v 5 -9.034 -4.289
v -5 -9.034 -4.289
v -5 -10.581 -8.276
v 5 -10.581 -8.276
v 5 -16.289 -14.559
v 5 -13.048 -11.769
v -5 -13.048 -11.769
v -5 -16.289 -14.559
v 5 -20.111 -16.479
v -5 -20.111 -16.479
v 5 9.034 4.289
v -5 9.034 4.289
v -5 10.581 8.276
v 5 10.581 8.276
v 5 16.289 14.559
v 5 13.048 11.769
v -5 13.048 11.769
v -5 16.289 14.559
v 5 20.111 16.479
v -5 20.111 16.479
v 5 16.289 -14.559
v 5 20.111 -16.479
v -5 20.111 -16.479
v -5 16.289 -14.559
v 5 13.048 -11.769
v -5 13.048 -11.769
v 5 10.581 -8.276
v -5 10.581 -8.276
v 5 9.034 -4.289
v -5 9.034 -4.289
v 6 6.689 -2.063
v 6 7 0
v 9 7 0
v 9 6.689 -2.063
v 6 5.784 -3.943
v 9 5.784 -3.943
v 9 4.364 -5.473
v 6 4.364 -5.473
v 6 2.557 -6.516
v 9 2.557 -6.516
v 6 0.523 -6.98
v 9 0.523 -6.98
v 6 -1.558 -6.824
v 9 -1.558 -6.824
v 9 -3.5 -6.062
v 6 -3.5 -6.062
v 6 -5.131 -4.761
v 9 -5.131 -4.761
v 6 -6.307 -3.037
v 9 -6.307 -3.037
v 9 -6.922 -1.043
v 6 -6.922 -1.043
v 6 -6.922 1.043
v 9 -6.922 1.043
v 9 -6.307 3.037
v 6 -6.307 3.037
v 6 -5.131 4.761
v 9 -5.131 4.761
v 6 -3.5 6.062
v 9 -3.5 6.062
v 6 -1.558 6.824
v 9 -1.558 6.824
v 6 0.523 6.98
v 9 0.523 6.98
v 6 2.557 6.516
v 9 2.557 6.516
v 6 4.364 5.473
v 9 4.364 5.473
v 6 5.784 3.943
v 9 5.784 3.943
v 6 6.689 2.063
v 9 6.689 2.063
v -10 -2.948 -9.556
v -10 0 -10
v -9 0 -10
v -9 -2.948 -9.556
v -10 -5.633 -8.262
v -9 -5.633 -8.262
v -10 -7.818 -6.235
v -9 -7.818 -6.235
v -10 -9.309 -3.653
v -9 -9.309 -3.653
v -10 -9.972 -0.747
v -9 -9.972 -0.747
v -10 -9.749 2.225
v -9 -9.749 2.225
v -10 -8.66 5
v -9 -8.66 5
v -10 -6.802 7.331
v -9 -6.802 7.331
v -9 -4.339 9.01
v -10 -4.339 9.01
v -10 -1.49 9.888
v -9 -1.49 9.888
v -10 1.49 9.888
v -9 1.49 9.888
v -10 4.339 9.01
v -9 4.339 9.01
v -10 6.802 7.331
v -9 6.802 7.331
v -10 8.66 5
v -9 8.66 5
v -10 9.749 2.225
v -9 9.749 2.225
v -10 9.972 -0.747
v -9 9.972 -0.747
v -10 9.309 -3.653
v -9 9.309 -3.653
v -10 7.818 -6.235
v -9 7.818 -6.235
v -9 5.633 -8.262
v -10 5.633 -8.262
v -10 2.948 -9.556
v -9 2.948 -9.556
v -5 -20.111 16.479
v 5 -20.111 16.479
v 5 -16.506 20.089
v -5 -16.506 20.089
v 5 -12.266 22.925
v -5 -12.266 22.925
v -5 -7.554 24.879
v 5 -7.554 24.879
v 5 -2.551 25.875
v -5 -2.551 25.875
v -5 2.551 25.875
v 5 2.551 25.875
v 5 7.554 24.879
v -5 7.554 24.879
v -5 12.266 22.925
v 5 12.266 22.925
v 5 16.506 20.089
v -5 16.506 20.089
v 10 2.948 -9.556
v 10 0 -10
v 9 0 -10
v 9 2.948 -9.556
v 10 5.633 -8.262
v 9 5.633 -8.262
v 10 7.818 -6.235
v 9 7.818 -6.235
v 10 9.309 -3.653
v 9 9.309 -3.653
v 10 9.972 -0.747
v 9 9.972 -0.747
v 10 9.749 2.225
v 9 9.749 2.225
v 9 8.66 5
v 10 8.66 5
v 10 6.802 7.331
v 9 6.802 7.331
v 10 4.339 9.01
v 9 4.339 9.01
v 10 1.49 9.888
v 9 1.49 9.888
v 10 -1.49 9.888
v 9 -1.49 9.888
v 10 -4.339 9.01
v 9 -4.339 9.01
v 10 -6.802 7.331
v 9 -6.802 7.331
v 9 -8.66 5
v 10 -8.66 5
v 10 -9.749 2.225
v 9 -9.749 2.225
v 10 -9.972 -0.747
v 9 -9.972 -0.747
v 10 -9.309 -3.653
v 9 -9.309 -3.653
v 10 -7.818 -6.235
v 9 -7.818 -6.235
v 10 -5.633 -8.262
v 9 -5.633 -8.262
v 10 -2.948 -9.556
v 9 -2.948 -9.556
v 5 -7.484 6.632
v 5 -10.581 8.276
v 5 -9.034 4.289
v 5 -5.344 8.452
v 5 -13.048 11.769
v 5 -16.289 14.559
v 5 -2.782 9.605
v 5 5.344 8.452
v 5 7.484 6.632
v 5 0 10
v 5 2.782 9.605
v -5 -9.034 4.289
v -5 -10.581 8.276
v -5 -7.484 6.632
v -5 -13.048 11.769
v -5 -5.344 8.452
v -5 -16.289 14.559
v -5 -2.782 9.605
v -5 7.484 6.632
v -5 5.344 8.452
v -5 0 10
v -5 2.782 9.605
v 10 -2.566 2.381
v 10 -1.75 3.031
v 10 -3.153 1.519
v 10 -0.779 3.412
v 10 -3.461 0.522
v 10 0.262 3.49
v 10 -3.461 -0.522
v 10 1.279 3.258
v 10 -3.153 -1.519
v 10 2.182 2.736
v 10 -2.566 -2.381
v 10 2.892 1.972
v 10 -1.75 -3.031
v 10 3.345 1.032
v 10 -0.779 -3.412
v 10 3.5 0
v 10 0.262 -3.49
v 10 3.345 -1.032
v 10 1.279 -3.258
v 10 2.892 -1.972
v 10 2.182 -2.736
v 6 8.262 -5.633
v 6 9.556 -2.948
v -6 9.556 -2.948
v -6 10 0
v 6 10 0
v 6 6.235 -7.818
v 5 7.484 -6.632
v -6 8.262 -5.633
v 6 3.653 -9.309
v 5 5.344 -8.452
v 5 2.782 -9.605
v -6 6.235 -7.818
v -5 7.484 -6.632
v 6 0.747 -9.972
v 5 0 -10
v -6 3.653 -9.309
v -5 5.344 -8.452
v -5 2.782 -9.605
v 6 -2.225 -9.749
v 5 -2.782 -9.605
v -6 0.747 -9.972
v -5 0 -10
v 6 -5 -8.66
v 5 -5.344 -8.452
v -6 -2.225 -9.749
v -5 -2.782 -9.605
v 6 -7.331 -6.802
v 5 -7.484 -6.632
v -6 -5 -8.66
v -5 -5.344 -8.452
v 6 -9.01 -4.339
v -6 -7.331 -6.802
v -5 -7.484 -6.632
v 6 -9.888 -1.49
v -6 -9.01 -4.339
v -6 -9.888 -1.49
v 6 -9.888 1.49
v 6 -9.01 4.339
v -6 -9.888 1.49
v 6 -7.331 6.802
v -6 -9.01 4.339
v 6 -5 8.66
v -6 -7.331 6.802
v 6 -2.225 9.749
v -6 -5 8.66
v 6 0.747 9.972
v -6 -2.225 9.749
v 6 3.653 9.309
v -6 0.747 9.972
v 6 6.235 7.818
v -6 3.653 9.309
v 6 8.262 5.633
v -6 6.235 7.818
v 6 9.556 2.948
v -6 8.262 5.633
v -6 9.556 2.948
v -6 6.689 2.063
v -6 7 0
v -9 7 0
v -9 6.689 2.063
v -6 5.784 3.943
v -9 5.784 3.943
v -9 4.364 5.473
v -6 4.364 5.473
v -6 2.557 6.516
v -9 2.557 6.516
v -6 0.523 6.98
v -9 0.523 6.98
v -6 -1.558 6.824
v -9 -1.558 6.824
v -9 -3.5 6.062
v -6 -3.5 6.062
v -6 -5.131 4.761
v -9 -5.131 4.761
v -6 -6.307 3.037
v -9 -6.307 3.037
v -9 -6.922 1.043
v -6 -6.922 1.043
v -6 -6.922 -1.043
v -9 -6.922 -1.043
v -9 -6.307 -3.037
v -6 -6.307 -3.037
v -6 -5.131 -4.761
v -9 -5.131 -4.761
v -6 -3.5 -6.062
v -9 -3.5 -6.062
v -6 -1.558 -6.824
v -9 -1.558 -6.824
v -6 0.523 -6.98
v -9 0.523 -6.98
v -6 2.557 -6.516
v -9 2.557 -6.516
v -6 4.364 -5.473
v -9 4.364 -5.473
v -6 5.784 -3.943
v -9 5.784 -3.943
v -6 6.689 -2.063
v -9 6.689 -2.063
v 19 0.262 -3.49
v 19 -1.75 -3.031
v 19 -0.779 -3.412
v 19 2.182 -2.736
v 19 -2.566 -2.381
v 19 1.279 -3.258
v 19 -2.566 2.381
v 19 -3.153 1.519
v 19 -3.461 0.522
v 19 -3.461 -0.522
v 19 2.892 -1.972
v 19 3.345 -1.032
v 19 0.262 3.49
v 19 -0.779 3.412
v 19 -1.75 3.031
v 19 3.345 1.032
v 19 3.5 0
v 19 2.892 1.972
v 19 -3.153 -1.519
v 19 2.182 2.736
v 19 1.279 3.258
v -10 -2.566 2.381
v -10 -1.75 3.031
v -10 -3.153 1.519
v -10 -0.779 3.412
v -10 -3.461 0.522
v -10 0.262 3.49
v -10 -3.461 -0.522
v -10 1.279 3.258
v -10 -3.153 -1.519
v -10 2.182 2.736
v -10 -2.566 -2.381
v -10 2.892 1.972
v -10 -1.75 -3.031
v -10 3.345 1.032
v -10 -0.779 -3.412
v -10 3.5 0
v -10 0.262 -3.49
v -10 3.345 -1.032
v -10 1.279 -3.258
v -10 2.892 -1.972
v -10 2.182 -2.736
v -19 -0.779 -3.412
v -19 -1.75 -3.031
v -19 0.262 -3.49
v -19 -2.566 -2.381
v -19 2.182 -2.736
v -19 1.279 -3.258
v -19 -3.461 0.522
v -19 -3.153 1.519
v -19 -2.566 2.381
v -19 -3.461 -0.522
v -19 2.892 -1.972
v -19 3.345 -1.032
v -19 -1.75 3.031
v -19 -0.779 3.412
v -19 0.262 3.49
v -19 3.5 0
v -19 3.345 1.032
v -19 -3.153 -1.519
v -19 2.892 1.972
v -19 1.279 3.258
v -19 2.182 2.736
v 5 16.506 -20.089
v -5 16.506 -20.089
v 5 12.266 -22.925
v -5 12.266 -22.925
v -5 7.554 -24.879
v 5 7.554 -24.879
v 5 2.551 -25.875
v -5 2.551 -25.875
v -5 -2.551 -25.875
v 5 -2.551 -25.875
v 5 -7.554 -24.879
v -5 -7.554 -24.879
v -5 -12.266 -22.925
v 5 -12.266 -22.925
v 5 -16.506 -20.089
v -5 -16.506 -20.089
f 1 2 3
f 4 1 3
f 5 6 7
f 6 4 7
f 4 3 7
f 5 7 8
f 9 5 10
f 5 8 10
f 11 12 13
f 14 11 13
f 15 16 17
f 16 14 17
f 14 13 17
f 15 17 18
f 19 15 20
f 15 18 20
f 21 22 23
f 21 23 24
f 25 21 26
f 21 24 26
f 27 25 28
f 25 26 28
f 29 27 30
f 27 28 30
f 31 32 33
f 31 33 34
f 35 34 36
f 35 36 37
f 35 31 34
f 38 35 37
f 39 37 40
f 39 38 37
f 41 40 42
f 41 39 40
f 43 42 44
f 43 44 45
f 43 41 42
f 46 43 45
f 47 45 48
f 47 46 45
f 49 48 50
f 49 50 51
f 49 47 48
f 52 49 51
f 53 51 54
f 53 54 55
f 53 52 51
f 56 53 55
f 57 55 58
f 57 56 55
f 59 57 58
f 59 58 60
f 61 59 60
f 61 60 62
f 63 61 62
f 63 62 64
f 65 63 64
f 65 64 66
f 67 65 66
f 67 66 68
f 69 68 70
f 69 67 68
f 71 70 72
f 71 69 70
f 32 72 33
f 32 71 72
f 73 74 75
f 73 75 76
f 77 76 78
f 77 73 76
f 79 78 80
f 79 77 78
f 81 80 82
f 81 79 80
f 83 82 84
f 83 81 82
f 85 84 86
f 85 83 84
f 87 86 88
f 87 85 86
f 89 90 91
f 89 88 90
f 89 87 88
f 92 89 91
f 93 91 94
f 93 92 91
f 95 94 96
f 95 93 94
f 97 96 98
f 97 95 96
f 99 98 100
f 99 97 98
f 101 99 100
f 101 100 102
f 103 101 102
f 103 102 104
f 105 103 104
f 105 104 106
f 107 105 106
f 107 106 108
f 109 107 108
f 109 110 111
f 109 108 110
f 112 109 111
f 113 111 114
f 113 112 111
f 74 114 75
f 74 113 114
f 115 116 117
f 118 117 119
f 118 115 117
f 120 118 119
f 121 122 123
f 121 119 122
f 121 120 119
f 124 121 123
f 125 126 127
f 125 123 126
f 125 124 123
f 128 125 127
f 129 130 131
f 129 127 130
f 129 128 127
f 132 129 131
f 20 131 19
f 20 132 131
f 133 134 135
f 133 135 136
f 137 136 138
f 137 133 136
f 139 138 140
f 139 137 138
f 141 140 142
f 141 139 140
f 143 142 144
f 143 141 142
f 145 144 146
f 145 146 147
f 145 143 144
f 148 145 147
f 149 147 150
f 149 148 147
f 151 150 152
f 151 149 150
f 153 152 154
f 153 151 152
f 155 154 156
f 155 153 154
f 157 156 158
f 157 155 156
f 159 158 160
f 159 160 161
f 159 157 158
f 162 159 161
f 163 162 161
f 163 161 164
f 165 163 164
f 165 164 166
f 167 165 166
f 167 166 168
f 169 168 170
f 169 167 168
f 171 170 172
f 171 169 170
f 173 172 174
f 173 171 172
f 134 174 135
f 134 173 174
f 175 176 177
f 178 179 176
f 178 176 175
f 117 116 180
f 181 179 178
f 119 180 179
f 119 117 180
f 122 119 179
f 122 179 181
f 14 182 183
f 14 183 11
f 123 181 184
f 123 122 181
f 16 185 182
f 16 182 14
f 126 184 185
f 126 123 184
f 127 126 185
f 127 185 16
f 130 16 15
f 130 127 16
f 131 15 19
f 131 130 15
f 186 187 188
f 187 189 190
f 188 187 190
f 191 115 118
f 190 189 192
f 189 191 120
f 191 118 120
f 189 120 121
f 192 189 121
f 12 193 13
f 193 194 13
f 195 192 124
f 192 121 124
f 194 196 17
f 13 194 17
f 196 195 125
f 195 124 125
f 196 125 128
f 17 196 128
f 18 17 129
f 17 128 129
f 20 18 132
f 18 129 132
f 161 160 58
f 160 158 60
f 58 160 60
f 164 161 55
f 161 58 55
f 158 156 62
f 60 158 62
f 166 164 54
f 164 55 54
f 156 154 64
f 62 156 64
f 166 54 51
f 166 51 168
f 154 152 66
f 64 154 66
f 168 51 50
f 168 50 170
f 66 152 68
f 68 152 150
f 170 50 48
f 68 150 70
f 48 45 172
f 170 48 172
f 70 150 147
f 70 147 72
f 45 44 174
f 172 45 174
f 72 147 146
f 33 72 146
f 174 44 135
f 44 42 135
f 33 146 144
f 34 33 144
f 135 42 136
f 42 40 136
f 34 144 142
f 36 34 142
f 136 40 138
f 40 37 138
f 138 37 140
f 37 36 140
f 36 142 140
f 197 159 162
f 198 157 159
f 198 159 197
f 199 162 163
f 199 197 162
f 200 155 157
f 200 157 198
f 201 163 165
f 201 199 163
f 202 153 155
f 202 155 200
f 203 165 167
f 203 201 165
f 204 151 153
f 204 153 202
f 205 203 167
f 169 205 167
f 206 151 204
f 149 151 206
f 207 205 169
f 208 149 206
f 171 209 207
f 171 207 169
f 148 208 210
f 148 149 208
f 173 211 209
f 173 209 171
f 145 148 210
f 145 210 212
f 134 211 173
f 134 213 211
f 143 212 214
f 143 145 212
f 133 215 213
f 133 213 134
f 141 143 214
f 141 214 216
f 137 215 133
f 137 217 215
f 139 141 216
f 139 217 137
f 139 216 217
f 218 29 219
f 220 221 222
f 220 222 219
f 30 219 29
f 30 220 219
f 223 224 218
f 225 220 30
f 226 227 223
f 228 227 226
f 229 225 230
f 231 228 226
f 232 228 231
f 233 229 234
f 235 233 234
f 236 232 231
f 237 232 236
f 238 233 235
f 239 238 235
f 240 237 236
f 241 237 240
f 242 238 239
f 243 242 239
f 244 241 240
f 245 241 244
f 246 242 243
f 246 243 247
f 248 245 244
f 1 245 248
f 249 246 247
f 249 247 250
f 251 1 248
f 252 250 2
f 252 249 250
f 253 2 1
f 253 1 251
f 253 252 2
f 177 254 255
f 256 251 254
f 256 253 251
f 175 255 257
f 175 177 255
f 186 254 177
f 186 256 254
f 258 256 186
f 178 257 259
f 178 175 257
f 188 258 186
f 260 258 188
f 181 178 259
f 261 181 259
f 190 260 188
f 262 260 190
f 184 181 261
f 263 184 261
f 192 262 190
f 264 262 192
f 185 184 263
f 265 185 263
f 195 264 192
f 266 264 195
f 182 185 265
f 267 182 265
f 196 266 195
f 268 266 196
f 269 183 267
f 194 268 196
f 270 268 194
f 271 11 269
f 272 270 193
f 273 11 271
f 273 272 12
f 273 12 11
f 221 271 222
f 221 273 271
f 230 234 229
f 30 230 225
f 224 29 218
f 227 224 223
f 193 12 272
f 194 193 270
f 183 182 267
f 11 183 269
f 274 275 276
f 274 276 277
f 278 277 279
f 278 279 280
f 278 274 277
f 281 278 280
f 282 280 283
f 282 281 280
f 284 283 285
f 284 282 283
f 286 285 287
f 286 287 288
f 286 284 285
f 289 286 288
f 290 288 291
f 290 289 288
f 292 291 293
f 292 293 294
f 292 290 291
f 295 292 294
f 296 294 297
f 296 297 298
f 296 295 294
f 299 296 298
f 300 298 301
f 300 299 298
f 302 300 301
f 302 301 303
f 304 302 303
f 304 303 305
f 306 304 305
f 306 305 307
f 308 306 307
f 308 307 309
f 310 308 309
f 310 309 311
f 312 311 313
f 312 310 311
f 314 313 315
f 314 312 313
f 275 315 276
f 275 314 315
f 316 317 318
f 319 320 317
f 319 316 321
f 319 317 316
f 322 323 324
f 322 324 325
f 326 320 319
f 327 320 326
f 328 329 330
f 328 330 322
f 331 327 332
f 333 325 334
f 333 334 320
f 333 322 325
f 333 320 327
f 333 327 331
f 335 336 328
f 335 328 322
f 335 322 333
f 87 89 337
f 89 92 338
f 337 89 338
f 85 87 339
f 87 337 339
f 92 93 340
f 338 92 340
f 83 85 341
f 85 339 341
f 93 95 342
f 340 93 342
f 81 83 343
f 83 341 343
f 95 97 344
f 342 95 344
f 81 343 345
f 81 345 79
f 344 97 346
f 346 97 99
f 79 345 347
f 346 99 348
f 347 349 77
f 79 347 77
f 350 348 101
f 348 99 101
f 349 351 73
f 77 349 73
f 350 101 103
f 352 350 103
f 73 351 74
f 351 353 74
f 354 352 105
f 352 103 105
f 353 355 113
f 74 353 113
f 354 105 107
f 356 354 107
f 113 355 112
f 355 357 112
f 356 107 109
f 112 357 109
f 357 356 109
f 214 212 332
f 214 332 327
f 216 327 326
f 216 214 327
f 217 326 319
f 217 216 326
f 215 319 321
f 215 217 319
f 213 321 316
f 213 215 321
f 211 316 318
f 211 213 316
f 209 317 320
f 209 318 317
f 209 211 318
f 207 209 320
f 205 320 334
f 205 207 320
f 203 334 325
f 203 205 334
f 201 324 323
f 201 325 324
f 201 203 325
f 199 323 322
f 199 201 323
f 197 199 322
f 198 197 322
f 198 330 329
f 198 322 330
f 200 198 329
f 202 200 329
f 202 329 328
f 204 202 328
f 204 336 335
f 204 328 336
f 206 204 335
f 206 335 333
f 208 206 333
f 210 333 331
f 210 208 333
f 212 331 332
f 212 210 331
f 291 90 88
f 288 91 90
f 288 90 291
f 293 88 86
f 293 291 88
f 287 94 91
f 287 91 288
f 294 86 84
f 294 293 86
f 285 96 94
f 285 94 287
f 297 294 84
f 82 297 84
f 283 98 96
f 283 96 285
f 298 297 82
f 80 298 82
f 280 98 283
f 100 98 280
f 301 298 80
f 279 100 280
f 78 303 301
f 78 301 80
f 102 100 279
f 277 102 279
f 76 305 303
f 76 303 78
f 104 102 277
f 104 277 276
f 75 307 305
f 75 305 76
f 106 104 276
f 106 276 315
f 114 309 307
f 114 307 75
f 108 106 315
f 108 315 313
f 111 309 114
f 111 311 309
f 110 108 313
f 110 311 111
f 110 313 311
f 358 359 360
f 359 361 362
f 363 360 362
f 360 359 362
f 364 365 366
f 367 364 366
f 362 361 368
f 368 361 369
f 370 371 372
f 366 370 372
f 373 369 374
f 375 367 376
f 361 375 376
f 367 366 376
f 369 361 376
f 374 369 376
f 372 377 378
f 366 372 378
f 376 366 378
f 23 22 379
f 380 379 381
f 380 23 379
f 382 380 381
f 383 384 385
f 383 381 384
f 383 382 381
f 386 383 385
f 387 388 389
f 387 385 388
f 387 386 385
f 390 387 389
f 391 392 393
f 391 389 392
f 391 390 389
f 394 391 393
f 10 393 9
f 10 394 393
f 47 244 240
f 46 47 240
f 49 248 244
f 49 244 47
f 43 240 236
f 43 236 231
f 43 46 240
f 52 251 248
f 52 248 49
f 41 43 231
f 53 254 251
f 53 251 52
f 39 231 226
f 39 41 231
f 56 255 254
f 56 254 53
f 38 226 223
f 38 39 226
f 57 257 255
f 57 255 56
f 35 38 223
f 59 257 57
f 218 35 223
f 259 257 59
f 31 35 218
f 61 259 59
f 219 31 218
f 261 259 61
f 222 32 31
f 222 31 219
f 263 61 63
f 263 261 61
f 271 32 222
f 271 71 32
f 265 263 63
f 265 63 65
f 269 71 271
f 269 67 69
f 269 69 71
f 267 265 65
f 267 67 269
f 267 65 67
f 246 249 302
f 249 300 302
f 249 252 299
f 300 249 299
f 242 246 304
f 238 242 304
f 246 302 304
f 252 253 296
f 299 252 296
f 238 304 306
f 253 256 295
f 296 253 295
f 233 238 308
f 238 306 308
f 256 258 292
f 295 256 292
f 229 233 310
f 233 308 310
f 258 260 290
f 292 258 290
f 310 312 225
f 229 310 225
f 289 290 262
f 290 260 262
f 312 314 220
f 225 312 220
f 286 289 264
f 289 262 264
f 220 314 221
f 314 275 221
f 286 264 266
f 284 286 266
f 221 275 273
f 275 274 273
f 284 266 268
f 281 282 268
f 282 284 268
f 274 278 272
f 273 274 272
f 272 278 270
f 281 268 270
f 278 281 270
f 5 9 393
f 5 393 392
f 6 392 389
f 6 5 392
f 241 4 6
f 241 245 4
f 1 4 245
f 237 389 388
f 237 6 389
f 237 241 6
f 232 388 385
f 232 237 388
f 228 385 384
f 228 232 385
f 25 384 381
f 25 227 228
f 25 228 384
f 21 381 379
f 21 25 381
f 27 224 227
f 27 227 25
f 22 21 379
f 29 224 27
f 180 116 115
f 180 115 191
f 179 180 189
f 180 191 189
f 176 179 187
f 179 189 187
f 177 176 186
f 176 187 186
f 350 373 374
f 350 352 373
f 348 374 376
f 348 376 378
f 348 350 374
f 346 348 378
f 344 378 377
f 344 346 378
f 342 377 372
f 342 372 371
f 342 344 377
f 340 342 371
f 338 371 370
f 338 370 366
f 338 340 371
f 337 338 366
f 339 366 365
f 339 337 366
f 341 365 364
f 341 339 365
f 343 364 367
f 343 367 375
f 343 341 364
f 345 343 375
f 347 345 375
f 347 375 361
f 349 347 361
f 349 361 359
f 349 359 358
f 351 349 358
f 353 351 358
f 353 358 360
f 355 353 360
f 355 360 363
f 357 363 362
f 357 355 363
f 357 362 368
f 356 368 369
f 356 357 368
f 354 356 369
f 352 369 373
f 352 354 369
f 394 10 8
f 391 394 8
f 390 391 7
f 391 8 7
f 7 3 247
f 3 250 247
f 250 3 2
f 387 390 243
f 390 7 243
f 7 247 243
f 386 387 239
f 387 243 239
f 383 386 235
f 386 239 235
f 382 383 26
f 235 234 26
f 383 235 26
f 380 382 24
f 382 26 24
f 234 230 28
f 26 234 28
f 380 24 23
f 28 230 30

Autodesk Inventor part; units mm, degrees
ref_plane "YZ Plane" through (0, 0, 0) normal (1, 0, 0) x (0, 1, 0)
ref_plane "XZ Plane" through (0, 0, 0) normal (0, 1, 0) x (-1, 0, 0)
ref_plane "XY Plane" through (0, 0, 0) normal (0, 0, 1) x (1, 0, 0)
sketch "Boceto1" plane through (0, 0, 0) normal (1, 0, 0) x (0, 1, 0)
  circle A0 centre (0, 0) radius 3.5
  dimension "d0" = 7
extrude "Extrusión1" add sketch "Boceto1" along normal mid plane 38
sketch "Boceto2" plane through (0, 0, 0) normal (1, 0, 0) x (0, 1, 0)
  arc A0 (20.1106, 16.4792) -> (20.1106, -16.4792) centre (26, 0) ccw
  arc A1 (-20.1106, -16.4792) -> (-20.1106, 16.4792) centre (-26, 0) ccw
  arc A2 (-20.1106, -16.4792) -> (20.1106, -16.4792) centre (0, 0) ccw
  arc A3 (20.1106, 16.4792) -> (-20.1106, 16.4792) centre (0, 0) ccw
  dimension "d22" = 35
  dimension "d23" = 35
extrude "Extrusión2" add sketch "Boceto2" along normal mid plane 10
sketch "Boceto3" plane through (0, 0, 0) normal (1, 0, 0) x (0, 1, 0)
  circle A0 centre (0, 0) radius 10
  dimension "d8" = 20
extrude "Extrusión3" add sketch "Boceto3" along normal mid plane 12
sketch "Boceto4" plane through (0, 0, 0) normal (1, 0, 0) x (0, 1, 0)
  circle A0 centre (0, 0) radius 3.5 projected
  circle A1 centre (0, 0) radius 7
  dimension "d11" = 14
extrude "Extrusión4" add sketch "Boceto4" along normal mid plane 20
sketch "Boceto6" plane through (0, 0, 0) normal (0, 1, 0) x (-1, 0, 0)
  line L0 (10, -3.5) -> (10, 3.5) projected
  line L1 (10, 0) -> (9, 0)
  line L2 (9, 0) -> (9, -10)
  line L3 (9, -10) -> (10, -10)
  line L4 (10, -10) -> (10, 0)
  line L5 (26.6, 0) -> (-26.6, 0) projected
  point P0 (0, 0)
  dimension "d15" = 1
  dimension "d16" = 10
revolve "Revolución1" add sketch "Boceto6" angle 360 about axis through (-10, 0, 0) along (1, 0, 0)
sketch "Boceto7" plane through (0, 0, 0) normal (0, 1, 0) x (-1, 0, 0)
  line L0 (-10, 7) -> (-10, -7) projected
  line L1 (-10, 0) -> (-9, 0)
  line L2 (-9, 0) -> (-9, -10)
  line L3 (-9, -10) -> (-10, -10)
  line L4 (-10, -10) -> (-10, 0)
  line L5 (26.6, 0) -> (-26.6, 0) projected
  point P0 (0, 0)
  dimension "d18" = 1
  dimension "d19" = 10
revolve "Revolución2" add sketch "Boceto7" angle 360 about axis through (-10, 0, 0) along (1, 0, 0)
properties part number "arma" material "Aluminio 6061"
